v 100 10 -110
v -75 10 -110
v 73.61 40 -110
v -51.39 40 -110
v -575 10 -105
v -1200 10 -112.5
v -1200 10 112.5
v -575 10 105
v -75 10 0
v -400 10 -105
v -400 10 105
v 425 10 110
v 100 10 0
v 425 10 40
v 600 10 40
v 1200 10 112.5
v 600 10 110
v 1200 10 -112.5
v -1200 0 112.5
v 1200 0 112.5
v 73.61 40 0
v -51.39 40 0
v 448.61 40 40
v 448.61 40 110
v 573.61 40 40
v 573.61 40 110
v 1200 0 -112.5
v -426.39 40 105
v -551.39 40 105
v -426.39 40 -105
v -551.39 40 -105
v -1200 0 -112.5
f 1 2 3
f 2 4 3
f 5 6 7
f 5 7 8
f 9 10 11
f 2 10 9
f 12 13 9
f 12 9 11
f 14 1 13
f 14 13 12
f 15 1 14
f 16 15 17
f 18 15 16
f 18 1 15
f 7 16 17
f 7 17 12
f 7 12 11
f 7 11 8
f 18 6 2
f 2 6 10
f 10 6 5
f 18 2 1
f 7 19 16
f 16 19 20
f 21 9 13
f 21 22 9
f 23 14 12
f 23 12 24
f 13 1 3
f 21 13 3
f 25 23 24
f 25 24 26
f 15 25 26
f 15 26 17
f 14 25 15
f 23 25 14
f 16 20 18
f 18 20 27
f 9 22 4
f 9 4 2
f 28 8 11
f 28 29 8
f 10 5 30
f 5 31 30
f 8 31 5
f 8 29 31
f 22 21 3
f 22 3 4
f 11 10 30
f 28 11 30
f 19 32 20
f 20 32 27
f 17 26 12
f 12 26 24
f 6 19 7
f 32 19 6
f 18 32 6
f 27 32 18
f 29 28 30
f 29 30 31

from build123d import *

# Parameters (mm, degrees)
SKETCH1_W           = 2400
SKETCH1_H           = 225
BOSS_EXTRUDE1_DEPTH = 10
BOSS_EXTRUDE2_START = 40
BOSS_EXTRUDE2_DEPTH = 70
BOSS_EXTRUDE5_DEPTH = 110
BOSS_EXTRUDE6_DEPTH = 105


with BuildPart() as part:
    # Sketch1 → Boss-Extrude1 (new body)
    with BuildSketch(Plane(origin=(0, 0, 0), x_dir=(1, 0, 0), z_dir=(0, 1, 0))):
        Rectangle(SKETCH1_W, SKETCH1_H)
    extrude(amount=BOSS_EXTRUDE1_DEPTH)

    # Sketch4 → Boss-Extrude2 (add)
    with BuildSketch(Plane.XY.offset(BOSS_EXTRUDE2_START)):
        Polygon((600, 10), (425, 10), (448.609614239, 40), (573.609614239, 40), align=None)
    extrude(amount=BOSS_EXTRUDE2_DEPTH)

    # Sketch10 → Boss-Extrude5 (add)
    with BuildSketch(Plane.XY):
        Polygon((-75, 10), (100, 10), (73.609614239, 40), (-51.390385761, 40), align=None)
    extrude(amount=-BOSS_EXTRUDE5_DEPTH)

    # Sketch11 → Boss-Extrude6 (add, symmetric)
    with BuildSketch(Plane.XY):
        Polygon((-575, 10), (-400, 10), (-426.390385761, 40), (-551.390385761, 40), align=None)
    extrude(amount=BOSS_EXTRUDE6_DEPTH, both=True)


solid = part.part
